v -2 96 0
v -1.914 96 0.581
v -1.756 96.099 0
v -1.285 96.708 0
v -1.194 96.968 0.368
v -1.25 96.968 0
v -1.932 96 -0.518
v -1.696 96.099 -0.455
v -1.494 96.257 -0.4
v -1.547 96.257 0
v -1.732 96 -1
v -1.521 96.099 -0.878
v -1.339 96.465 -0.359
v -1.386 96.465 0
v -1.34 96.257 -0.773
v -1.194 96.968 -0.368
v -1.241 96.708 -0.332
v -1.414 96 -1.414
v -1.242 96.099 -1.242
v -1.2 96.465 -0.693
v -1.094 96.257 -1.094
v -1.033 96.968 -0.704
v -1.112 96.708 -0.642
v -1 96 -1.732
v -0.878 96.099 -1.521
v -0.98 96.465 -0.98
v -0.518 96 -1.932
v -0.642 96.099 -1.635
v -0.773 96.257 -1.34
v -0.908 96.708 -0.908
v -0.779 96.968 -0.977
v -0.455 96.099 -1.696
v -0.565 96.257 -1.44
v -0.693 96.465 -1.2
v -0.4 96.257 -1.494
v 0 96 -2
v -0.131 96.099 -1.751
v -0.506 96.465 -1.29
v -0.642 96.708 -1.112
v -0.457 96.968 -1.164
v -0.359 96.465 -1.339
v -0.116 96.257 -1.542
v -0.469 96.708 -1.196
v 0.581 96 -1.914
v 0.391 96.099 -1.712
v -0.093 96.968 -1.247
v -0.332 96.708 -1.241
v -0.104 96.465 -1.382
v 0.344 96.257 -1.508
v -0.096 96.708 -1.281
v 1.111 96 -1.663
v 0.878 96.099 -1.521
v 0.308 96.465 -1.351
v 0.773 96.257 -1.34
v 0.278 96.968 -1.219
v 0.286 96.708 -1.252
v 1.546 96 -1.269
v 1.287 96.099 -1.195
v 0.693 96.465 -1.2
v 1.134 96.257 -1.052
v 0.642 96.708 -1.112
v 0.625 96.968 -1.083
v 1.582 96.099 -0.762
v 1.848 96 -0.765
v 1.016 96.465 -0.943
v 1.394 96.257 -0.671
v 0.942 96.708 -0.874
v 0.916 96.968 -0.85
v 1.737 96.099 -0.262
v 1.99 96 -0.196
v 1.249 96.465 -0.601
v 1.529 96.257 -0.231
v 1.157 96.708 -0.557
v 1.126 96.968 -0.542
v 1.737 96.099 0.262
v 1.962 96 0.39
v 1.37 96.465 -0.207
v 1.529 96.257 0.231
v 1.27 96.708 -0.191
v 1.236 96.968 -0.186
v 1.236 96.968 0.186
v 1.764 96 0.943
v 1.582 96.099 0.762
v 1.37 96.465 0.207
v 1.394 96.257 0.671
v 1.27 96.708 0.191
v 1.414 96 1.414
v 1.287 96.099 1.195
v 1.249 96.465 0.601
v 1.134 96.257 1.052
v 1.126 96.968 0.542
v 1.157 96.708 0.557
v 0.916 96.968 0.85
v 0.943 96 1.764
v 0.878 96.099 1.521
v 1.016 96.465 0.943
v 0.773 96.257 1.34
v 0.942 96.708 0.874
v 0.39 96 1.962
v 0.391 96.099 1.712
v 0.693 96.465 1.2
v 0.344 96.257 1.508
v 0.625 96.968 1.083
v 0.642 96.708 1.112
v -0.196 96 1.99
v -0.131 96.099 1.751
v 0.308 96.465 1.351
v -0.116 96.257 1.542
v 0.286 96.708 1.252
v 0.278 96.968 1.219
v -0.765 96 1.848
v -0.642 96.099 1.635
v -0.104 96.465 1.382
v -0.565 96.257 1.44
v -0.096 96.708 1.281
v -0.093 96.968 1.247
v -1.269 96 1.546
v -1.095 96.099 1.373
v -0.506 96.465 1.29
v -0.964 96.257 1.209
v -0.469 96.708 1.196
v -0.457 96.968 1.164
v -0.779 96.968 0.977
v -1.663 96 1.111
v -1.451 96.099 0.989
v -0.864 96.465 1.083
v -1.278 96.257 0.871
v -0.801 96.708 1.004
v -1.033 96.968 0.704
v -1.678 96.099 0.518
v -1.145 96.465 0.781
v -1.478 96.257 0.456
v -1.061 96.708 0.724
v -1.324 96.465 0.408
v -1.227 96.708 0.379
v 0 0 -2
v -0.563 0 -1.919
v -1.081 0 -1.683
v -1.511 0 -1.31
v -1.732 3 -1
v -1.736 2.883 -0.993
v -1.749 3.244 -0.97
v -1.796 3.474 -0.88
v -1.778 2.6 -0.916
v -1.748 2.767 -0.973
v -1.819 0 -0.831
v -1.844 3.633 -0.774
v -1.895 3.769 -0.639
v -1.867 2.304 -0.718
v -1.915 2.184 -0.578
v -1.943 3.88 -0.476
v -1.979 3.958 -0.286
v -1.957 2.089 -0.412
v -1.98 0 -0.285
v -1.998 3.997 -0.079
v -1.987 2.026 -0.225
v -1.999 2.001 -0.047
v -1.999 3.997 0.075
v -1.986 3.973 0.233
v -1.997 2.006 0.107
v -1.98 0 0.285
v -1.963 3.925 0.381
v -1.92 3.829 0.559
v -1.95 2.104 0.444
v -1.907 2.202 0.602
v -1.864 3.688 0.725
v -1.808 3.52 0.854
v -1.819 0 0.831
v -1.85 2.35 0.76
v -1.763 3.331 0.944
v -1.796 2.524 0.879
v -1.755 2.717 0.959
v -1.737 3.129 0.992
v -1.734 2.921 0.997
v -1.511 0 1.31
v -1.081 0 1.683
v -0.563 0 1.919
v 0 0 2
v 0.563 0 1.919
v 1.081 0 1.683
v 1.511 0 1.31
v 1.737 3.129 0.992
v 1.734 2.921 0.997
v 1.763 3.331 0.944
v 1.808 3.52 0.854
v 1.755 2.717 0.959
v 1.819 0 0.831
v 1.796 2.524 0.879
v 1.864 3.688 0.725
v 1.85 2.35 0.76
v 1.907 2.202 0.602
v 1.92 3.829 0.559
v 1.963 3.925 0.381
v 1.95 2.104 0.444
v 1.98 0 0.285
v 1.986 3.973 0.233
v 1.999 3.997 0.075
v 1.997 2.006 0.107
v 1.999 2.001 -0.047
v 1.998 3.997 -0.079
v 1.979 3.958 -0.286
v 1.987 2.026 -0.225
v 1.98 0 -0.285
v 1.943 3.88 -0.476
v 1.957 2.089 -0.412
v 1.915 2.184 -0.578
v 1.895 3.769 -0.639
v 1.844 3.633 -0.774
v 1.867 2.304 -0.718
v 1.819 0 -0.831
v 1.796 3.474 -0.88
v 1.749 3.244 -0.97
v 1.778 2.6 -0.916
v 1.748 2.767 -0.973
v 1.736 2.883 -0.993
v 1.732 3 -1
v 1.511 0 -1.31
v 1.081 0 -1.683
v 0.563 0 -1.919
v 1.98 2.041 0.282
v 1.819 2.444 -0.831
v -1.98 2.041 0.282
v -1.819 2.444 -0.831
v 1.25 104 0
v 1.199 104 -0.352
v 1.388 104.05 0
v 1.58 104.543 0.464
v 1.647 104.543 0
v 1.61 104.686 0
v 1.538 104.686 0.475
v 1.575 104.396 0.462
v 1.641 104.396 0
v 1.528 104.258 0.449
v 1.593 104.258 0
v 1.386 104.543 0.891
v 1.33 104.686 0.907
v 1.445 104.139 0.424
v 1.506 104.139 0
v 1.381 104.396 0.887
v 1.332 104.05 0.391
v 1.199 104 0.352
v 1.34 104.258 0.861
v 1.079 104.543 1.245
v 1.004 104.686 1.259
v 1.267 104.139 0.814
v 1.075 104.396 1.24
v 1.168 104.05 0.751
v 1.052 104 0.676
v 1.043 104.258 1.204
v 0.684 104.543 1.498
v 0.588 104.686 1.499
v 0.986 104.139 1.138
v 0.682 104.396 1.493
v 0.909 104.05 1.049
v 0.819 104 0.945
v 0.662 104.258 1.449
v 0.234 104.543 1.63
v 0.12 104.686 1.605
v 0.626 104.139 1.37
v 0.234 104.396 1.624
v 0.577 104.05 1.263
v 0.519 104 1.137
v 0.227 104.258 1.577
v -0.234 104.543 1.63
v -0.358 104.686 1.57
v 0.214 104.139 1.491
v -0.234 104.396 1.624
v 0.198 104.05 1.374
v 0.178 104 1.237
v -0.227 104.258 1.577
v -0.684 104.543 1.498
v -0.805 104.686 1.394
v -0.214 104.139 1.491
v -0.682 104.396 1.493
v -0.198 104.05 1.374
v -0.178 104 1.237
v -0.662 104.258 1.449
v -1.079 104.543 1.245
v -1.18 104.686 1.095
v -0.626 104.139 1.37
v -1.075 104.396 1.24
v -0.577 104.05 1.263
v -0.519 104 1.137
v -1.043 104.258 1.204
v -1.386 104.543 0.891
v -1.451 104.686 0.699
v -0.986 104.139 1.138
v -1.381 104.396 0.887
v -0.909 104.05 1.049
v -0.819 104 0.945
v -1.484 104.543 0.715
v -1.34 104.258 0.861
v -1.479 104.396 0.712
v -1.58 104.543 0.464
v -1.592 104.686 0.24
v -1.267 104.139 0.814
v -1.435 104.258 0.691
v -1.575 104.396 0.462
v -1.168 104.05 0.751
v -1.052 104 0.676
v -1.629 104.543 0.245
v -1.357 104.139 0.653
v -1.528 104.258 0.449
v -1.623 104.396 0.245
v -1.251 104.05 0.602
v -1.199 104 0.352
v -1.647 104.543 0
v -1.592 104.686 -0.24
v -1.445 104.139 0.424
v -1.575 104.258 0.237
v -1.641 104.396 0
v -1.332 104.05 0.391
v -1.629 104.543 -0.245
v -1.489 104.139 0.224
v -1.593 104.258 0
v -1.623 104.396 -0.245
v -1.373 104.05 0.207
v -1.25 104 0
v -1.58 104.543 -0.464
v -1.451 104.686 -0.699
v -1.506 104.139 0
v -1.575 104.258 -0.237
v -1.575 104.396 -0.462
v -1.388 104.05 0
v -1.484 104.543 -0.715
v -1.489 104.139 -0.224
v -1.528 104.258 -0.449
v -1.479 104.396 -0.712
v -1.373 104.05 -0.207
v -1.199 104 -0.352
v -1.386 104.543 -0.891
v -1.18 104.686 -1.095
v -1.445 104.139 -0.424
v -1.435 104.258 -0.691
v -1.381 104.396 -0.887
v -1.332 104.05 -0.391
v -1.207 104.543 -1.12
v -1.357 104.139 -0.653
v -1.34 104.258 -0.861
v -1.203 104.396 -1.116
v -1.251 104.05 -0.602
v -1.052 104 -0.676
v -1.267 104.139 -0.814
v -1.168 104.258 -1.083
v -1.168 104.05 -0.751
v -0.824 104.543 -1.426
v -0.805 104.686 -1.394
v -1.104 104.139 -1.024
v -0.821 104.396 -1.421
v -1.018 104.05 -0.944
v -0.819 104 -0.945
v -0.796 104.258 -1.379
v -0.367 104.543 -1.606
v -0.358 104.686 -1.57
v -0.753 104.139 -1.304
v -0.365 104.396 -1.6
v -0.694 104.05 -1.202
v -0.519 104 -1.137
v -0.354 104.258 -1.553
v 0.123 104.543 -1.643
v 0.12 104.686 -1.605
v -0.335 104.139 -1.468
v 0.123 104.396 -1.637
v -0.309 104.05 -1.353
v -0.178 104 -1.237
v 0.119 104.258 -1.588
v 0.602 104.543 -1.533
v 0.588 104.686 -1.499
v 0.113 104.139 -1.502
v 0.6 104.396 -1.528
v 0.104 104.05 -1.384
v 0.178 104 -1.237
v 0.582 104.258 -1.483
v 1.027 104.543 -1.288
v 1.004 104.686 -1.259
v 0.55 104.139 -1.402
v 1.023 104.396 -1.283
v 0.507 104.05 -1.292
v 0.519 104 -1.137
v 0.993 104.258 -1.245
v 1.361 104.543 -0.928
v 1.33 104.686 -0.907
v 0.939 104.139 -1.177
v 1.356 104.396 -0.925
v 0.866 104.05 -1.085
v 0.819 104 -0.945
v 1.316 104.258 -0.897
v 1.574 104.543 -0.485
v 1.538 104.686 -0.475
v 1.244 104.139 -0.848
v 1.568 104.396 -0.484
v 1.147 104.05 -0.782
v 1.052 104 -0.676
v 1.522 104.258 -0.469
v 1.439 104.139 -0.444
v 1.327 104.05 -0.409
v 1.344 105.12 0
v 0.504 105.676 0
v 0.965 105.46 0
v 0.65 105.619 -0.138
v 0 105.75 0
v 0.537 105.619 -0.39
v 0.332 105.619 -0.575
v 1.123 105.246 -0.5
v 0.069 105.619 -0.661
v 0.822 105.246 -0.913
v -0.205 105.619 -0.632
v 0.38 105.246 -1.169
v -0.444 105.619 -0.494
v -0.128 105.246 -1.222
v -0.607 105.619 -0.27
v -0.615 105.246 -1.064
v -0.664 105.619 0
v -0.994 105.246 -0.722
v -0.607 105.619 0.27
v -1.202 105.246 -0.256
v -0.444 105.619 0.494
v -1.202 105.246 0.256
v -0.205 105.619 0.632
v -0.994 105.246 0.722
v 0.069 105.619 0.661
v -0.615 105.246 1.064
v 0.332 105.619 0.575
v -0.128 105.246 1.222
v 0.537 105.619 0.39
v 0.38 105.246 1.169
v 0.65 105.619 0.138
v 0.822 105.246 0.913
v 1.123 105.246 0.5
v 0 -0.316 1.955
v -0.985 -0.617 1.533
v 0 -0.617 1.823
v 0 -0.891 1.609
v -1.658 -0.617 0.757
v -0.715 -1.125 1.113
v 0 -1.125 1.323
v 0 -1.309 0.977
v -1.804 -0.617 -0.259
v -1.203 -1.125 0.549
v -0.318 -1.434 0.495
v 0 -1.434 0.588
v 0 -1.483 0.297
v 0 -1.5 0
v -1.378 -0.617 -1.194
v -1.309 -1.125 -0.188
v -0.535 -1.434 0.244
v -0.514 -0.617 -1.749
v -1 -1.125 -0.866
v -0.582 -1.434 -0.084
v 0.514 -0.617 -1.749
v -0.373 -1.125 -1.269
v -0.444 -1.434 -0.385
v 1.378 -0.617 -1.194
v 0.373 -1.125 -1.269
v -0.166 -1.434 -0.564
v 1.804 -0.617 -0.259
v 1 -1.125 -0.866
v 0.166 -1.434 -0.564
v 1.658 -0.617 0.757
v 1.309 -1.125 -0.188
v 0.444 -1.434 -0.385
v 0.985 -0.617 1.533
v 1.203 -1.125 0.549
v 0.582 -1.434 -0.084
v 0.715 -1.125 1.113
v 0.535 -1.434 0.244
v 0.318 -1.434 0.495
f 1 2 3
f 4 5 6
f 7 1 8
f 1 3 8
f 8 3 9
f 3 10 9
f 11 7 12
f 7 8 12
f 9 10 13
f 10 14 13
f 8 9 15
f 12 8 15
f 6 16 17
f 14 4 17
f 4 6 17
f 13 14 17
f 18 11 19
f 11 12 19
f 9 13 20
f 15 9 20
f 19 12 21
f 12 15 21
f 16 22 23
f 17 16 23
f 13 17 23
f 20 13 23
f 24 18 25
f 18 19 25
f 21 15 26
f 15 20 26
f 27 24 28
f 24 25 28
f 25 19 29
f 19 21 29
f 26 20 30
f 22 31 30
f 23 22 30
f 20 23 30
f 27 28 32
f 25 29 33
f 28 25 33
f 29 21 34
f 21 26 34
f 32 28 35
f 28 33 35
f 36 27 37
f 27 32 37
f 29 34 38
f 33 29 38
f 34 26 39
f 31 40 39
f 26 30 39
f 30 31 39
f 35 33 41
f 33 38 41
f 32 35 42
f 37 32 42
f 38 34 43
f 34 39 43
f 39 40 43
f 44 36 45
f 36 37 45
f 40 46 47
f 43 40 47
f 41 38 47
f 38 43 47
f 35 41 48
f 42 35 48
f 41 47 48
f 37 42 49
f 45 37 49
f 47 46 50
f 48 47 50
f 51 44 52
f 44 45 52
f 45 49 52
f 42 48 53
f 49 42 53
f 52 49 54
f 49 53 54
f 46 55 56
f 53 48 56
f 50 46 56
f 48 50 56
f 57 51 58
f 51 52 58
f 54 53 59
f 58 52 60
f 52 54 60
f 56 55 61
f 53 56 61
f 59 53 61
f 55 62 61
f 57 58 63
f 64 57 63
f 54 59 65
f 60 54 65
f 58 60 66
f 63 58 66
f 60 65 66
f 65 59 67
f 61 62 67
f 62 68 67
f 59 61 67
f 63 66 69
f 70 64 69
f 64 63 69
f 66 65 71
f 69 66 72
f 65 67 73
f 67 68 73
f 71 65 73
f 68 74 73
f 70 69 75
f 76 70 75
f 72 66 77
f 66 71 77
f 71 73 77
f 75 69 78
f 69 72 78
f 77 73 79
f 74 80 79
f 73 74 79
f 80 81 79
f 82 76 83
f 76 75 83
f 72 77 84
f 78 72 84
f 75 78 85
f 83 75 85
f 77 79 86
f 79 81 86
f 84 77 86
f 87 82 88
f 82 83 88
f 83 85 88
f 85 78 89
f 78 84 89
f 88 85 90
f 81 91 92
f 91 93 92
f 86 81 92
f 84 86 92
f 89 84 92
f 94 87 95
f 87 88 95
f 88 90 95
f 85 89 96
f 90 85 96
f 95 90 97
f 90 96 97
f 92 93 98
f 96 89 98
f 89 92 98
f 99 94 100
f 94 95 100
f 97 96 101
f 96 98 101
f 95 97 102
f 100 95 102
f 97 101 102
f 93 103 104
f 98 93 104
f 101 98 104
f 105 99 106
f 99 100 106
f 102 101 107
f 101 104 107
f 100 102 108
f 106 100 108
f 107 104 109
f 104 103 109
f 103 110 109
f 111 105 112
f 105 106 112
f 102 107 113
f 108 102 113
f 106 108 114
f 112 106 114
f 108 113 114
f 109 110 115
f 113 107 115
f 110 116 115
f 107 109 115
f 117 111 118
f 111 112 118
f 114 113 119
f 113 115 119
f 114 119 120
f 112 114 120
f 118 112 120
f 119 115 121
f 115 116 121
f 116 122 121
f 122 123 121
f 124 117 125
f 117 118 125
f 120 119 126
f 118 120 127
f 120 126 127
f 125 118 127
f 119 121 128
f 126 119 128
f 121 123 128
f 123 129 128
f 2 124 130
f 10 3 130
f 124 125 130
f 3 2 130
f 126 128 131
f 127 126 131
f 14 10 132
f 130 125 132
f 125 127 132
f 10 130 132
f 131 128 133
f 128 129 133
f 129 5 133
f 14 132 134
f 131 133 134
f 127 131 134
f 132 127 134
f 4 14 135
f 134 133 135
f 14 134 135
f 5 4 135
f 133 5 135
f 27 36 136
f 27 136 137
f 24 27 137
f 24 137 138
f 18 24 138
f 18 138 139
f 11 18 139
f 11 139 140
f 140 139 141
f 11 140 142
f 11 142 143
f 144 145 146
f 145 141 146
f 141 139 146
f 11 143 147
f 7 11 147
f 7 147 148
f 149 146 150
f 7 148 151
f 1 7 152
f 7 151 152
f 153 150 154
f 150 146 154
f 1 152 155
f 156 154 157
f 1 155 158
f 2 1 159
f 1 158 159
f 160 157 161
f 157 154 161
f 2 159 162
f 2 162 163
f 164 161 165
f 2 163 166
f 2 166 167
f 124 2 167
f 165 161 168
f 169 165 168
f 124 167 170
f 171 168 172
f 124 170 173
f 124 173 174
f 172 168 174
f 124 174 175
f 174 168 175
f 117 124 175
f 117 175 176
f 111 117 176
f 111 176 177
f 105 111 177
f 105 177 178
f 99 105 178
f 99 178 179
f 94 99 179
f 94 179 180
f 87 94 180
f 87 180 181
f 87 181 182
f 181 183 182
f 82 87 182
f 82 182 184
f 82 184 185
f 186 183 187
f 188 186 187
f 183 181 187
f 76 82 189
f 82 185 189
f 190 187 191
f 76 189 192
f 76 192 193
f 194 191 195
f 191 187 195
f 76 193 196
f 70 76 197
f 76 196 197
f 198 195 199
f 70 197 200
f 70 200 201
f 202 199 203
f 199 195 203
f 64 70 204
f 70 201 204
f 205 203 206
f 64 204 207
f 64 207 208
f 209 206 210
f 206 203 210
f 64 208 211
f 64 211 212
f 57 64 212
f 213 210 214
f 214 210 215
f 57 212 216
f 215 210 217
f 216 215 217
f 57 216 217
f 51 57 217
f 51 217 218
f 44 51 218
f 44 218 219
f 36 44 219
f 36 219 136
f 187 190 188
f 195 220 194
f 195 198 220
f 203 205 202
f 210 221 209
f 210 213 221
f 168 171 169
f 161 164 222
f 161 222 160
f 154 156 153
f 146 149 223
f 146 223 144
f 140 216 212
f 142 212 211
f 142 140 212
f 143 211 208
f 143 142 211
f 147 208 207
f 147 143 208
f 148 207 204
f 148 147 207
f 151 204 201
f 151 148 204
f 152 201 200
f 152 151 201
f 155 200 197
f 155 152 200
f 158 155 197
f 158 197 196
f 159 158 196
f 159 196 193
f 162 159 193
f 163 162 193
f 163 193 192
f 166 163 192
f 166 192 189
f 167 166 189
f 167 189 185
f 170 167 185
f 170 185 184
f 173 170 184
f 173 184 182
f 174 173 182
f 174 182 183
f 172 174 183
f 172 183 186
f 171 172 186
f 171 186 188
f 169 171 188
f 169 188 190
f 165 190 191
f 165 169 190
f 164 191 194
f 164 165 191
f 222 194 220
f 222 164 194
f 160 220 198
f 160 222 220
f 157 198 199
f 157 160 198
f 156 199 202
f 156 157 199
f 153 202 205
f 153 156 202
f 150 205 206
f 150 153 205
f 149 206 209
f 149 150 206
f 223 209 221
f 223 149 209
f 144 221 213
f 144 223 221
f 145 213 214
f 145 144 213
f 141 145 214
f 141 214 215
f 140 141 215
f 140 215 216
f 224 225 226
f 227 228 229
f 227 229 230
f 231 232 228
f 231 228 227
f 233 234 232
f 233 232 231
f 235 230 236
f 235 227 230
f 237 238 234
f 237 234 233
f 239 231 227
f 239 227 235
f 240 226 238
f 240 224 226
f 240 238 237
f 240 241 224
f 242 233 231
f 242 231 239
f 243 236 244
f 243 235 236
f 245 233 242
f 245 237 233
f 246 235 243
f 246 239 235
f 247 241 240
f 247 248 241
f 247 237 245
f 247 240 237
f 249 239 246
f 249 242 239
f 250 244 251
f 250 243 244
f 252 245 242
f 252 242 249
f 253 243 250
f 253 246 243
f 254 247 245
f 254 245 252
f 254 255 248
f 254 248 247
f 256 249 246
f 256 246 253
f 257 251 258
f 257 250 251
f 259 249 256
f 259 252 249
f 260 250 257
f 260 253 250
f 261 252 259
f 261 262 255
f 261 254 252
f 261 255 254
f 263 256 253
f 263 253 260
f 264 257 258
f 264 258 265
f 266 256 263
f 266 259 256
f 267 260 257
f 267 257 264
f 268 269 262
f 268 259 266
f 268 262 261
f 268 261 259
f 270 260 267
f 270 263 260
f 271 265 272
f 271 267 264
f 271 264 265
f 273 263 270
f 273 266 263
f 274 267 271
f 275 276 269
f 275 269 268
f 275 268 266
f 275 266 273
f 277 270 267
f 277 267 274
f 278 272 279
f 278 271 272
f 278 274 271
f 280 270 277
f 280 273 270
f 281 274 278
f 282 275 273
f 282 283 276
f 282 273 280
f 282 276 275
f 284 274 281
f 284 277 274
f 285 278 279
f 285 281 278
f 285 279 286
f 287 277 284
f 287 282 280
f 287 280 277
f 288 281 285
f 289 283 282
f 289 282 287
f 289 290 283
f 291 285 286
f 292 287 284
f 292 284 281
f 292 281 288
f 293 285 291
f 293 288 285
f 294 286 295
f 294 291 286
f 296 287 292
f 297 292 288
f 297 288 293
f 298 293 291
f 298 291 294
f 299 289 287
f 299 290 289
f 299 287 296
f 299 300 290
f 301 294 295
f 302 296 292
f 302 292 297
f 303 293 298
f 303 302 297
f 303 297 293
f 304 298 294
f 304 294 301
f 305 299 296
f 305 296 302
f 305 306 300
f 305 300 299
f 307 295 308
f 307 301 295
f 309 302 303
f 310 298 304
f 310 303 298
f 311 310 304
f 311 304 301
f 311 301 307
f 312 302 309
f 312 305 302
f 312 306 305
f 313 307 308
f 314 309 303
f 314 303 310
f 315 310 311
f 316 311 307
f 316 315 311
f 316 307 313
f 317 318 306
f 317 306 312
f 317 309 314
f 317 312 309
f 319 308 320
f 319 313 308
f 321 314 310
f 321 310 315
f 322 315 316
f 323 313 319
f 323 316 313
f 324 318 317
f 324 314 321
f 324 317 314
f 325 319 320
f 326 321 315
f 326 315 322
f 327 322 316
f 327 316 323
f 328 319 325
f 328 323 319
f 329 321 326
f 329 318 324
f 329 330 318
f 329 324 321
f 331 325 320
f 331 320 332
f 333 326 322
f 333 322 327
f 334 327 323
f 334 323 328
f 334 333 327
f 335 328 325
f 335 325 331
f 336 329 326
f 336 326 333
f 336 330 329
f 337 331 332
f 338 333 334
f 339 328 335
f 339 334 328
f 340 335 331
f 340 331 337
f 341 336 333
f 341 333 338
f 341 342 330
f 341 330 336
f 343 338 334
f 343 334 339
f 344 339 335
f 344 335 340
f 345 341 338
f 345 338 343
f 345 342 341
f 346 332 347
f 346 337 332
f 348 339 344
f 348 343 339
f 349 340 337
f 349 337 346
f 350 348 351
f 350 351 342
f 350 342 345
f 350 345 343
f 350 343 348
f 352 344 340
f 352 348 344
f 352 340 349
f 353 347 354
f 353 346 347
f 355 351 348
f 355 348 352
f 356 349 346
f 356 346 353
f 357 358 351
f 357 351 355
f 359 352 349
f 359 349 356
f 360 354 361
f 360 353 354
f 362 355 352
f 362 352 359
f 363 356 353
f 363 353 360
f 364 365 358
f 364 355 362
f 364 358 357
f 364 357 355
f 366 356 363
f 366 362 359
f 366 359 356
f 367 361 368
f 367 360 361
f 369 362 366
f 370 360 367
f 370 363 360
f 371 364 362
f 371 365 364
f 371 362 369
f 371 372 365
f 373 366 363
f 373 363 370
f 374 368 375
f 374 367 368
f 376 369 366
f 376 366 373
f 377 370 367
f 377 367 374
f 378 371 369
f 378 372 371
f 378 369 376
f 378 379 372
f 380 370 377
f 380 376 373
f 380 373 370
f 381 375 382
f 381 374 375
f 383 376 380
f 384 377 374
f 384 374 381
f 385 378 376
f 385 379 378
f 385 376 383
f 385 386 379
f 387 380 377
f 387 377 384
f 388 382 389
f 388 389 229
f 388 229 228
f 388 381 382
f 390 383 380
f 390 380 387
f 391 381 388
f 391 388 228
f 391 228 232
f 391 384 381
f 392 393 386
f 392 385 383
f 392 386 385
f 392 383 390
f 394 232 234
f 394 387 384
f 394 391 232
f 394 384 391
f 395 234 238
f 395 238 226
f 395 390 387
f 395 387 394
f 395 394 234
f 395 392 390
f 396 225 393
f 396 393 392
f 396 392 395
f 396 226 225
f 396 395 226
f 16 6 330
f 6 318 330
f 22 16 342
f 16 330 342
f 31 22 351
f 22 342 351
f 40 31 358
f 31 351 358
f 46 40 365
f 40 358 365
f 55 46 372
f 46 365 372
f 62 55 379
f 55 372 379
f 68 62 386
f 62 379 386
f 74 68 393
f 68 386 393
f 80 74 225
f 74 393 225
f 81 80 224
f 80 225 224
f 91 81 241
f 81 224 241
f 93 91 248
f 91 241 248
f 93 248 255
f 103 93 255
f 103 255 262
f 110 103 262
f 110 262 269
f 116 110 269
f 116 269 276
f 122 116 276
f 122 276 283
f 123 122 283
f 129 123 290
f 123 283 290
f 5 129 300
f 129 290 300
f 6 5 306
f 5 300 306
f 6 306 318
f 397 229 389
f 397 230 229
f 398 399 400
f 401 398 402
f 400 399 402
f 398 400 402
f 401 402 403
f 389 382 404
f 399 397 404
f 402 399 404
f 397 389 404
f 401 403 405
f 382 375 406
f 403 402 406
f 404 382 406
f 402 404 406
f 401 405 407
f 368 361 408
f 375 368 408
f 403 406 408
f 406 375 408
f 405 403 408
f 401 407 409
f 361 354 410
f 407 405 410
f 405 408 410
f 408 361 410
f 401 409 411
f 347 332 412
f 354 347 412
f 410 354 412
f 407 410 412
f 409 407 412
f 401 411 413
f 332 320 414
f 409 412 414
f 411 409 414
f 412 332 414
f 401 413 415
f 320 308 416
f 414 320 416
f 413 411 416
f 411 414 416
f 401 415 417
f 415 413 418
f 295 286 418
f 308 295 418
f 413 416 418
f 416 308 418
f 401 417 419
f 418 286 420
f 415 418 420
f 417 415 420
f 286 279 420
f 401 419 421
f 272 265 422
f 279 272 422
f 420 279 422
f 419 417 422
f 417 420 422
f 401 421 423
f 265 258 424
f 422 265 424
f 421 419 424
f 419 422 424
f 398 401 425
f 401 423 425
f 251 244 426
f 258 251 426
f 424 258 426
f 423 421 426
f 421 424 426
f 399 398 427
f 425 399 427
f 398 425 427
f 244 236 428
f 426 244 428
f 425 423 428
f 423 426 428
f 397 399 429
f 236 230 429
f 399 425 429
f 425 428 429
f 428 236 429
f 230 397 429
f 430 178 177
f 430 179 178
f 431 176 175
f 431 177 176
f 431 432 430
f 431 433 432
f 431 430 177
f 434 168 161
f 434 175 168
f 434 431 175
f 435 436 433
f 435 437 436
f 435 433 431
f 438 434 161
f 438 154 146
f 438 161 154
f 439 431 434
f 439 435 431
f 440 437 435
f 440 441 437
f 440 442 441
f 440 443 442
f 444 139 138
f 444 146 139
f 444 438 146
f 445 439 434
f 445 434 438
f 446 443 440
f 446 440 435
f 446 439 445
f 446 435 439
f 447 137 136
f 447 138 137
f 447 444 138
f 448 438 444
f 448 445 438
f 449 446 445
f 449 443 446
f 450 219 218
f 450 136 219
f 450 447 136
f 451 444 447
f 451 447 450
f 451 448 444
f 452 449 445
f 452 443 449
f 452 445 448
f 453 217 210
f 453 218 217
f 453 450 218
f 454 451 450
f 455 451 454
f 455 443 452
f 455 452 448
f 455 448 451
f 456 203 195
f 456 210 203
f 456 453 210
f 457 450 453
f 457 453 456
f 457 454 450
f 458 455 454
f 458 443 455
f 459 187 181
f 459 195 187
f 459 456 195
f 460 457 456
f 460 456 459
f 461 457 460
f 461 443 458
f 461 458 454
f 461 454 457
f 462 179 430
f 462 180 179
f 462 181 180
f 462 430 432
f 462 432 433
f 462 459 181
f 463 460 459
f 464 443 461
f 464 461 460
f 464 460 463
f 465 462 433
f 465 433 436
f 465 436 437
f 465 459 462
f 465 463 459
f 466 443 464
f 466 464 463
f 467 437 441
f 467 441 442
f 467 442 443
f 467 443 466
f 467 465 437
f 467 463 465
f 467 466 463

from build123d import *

# Parameters (mm, degrees)
SKETCH1_R               = 2
BOSS_EXTRUDE1_DEPTH     = 104
DOME2_FACE_RADIUS       = 2
DOME2_HEIGHT            = 1.5
CUT_EXTRUDE1_DEPTH      = 105.038454433
CUT_EXTRUDE1_DEPTH_BACK = 105.038454433
SKETCH2_R               = 1
SKETCH6_W               = 0.75
SKETCH6_H               = 8
FILLET1_R               = 0.5
FILLET2_R               = 1


with BuildPart() as part:
    # Sketch1 → Boss-Extrude1 (new body)
    with BuildSketch(Plane(origin=(0, 0, 0), x_dir=(1, 0, 0), z_dir=(0, 1, 0))):
        with Locations(Location((0, 0, 0), (0, 0, 90))):
            Circle(SKETCH1_R)
    extrude(amount=BOSS_EXTRUDE1_DEPTH)

    # Dome2: an elliptical dome of height H over a round flat face of radius A is half a spheroid: the quarter ellipse of half axes A and H revolved about the face's axis
    with BuildSketch(Plane((0, 0, 0), x_dir=(0, 0, 1), z_dir=(1, 0, 0)), mode=Mode.PRIVATE) as dome2_quarter:
        Ellipse(DOME2_FACE_RADIUS, DOME2_HEIGHT)
        Rectangle(DOME2_FACE_RADIUS, DOME2_HEIGHT, align=(Align.MIN, Align.MIN), mode=Mode.INTERSECT)
    revolve(dome2_quarter.sketch, axis=Axis((0, 0, 0), (0, -1, 0)))

    # Sketch2 → Cut-Extrude1 (cut, two sides: drawn at the far end of the back side and taken through both)
    with BuildSketch(Plane(origin=(0, 0, 0), x_dir=(0, 0, -1), z_dir=(1, 0, 0)).offset(-CUT_EXTRUDE1_DEPTH_BACK)):
        with Locations((0, 3)):
            Circle(SKETCH2_R)
    extrude(amount=CUT_EXTRUDE1_DEPTH + CUT_EXTRUDE1_DEPTH_BACK, mode=Mode.SUBTRACT)

    # Sketch5 → Revolve1 (revolve)
    with BuildSketch(Plane.XY):
        with BuildLine():
            Line((0, 102.25), (0, 105.75))
            ThreePointArc((0, 105.75), (1.75, 104), (0, 102.25))
        make_face()
    revolve(axis=Axis((0, 102.25, 0), (0, 1, 0)))

    # Sketch6 → Cut-Revolve1 (revolve, cut)
    with BuildSketch(Plane.XY, mode=Mode.PRIVATE) as cut_revolve1_sk:
        with Locations((1.625, 100)):
            Rectangle(SKETCH6_W, SKETCH6_H)
    revolve(cut_revolve1_sk.sketch.rotate(Axis((0, 105.75, 0), (0, -1, 0)), 180), axis=Axis((0, 105.75, 0), (0, -1, 0)), mode=Mode.SUBTRACT)

    # Fillet1
    # the kernel refuses this fillet: 0.5 mm, written as the material it takes off along each edge
    with BuildSketch(Plane(origin=(0, 104, 0), x_dir=(1, 0, 0), z_dir=(0, 0, -1))) as fillet1_piece_1:
        with BuildLine():
            CenterArc((1.15, -0.489897949), FILLET1_R, 336.926081934, 101.536959033)
            Line((1.61, -0.685857128), (1.6192, -0.689776312))
            ThreePointArc((1.6192, -0.689776312), (1.724440779, -0.352), (1.76, 0))
            Line((1.76, 0), (1.75, 0.01))
            ThreePointArc((1.75, 0.01), (1.5, 0.01), (1.252, 0.009797959))
            Line((1.252, 0.009797959), (1.25, 0))
        make_face()
    revolve(axis=Axis((0, 104, 0), (0, -1, 0)), mode=Mode.SUBTRACT)

    # Fillet2
    # the kernel refuses this fillet: 1 mm, written as the material it adds along each edge
    with BuildSketch(Plane(origin=(0, 96, 0), x_dir=(-1, 0, 0), z_dir=(0, 0, 1))) as fillet2_piece_1:
        with BuildLine():
            CenterArc((2.25, -0.968245837), FILLET2_R, 104.477512186, 75.522487814)
            Line((1.25, -0.968245837), (1.23, -0.968245837))
            Line((1.23, -0.968245837), (1.23, 0))
            Line((1.23, 0), (1.25, 0.02))
            ThreePointArc((1.25, 0.02), (1.625, 0.02), (1.995, 0.019364917))
            Line((1.995, 0.019364917), (2, 0))
        make_face()
    revolve(axis=Axis((0, 96, 0), (0, -1, 0)))


solid = part.part
